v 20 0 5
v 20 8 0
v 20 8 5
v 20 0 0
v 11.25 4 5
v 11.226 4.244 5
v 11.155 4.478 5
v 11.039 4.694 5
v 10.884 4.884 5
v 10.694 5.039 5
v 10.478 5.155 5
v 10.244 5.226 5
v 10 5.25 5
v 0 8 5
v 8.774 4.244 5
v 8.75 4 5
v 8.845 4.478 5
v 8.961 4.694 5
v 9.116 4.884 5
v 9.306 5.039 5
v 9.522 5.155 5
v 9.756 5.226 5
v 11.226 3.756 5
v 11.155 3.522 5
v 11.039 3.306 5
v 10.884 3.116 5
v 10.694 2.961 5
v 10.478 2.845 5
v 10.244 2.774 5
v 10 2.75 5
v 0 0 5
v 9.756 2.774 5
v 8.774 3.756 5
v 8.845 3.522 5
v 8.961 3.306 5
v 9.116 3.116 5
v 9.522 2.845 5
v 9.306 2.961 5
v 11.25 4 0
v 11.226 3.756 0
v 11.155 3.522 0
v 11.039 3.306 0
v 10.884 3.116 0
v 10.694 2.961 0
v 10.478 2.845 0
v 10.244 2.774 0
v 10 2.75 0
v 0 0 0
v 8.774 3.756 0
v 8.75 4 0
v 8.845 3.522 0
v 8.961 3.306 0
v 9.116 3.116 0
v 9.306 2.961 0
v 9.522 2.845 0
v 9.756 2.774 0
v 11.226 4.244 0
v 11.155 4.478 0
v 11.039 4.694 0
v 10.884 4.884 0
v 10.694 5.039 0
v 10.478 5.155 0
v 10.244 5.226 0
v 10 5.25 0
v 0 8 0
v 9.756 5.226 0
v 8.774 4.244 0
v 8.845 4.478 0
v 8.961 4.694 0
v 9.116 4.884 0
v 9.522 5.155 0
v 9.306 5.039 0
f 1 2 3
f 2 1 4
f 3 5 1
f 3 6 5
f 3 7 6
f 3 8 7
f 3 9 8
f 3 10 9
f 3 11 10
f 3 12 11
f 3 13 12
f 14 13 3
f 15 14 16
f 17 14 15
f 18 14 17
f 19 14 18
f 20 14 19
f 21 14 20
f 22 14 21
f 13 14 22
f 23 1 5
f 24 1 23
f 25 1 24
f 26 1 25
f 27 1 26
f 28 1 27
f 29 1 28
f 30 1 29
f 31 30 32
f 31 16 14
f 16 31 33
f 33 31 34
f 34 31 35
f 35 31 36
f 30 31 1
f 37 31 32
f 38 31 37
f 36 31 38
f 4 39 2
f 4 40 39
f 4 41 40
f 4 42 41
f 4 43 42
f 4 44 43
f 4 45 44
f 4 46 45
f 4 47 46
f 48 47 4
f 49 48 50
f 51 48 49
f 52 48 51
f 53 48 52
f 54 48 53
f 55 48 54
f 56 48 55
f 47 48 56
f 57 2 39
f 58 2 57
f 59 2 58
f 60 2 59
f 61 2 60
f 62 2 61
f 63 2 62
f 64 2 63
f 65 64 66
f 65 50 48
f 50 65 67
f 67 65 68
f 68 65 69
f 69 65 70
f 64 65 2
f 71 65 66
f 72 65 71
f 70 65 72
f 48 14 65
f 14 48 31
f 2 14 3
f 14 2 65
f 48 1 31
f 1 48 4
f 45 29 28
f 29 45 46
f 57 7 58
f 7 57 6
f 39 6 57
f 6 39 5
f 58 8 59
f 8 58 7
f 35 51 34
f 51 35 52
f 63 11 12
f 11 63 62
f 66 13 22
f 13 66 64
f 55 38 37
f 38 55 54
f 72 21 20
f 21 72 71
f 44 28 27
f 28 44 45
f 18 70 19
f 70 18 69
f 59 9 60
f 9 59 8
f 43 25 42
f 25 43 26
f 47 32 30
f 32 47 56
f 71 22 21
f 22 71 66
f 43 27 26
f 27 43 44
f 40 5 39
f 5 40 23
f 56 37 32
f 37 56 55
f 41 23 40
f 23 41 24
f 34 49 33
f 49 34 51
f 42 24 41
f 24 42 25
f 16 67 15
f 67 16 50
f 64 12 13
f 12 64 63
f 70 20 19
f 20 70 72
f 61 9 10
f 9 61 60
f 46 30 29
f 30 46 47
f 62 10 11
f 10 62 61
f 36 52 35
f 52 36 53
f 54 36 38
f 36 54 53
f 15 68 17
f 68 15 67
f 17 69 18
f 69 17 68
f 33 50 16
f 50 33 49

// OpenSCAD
$fn = 32;

// ----------------------------------------------------------------------
// Micro pad: drilled pad, 5-20 mm class
// ----------------------------------------------------------------------

// --- parameters (mm) ---
pad_l = 20;               // pad length, X
pad_w = 8;                // pad width, Y
pad_t = 5;                // pad thickness, Z
hole_d = 2.5;             // through hole diameter

difference() {
  cube([pad_l, pad_w, pad_t]);
  translate([pad_l / 2, pad_w / 2, -1])
    cylinder(h = pad_t + 2, d = hole_d);
}
